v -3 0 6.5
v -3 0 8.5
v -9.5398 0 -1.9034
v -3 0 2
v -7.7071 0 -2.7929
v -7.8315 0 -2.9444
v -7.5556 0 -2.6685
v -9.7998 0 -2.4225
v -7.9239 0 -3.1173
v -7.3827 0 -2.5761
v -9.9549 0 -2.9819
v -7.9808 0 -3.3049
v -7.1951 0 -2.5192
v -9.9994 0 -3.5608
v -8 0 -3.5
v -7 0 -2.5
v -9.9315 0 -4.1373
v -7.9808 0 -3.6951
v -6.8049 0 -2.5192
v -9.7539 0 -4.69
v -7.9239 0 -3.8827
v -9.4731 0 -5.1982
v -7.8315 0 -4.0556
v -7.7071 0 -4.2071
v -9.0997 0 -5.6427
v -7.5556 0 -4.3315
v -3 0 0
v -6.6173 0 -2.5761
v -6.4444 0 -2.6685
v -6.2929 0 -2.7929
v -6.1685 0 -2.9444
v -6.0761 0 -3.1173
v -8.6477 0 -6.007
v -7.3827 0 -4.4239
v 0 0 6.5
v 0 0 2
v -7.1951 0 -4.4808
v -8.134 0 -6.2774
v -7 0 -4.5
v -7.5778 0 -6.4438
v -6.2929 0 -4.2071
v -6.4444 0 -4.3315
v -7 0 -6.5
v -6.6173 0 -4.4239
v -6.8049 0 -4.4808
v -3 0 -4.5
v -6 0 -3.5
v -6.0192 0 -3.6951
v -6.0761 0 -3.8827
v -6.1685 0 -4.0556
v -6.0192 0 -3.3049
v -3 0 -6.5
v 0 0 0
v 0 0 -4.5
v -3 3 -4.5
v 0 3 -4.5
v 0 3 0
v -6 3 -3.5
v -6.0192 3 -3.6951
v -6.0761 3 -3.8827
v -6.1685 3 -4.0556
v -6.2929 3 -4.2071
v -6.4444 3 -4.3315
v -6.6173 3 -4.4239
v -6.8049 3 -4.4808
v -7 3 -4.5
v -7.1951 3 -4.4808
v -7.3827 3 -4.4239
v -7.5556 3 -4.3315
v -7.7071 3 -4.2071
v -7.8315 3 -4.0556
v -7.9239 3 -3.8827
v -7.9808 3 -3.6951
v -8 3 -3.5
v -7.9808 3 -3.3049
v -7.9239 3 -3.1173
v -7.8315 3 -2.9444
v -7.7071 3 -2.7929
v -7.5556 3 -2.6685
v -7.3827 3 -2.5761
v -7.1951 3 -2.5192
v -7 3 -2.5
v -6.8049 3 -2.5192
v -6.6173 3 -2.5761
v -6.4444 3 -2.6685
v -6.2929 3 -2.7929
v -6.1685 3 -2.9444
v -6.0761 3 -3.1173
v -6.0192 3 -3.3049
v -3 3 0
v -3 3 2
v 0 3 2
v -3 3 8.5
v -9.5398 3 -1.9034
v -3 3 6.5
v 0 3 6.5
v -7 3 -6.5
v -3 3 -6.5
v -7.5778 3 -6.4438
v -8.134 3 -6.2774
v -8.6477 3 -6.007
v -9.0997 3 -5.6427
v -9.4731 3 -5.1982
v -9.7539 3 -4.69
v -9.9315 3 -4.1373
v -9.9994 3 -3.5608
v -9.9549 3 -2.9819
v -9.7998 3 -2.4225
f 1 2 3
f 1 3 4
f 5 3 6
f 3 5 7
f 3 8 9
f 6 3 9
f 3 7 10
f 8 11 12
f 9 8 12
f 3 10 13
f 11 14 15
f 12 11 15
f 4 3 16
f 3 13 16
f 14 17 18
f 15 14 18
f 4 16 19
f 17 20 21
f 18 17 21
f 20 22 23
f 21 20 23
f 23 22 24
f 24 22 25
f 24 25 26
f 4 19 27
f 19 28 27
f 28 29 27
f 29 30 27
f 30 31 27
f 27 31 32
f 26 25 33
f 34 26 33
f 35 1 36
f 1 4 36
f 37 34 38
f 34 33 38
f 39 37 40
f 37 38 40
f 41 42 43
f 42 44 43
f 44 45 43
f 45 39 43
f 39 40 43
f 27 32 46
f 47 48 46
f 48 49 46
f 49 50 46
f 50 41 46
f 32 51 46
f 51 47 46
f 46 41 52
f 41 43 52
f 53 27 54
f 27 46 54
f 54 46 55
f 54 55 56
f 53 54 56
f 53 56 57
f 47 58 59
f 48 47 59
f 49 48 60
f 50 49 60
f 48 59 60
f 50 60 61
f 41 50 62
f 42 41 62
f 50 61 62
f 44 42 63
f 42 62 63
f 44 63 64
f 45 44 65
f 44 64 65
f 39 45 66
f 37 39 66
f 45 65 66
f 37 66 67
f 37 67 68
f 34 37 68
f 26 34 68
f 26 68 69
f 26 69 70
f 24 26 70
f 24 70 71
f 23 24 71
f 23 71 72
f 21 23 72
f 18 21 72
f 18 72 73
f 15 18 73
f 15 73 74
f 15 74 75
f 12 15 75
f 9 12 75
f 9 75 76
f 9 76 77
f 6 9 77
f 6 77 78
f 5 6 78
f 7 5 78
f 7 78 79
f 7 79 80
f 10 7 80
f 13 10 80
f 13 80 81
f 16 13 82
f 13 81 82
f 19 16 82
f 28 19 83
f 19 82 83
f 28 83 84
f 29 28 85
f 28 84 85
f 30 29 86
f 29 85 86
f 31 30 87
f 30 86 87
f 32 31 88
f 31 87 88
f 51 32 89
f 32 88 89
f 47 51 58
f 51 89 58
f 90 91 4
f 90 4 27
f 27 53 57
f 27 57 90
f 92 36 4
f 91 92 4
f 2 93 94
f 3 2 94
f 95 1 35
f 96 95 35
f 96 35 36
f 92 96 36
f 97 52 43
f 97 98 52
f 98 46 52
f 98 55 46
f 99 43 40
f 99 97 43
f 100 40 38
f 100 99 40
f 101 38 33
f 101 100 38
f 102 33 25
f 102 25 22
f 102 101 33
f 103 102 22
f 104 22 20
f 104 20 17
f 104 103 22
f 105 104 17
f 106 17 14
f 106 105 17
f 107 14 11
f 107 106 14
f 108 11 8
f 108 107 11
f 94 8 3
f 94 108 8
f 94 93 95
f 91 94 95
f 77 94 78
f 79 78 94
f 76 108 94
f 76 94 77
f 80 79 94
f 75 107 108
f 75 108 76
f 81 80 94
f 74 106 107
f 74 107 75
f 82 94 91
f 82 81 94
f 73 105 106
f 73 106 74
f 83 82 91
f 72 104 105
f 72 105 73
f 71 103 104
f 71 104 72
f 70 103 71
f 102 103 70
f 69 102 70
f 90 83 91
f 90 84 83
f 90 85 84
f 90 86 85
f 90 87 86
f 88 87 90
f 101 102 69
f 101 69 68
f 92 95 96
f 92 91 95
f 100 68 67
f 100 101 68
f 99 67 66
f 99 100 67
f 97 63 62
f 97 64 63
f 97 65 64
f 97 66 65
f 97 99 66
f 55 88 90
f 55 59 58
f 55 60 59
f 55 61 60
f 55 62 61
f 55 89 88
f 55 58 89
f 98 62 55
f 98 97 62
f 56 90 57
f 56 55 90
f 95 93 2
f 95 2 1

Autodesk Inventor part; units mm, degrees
ref_plane "YZ Plane" through (0, 0, 0) normal (1, 0, 0) x (0, 1, 0)
ref_plane "XZ Plane" through (0, 0, 0) normal (0, 1, 0) x (-1, 0, 0)
ref_plane "XY Plane" through (0, 0, 0) normal (0, 0, 1) x (1, 0, 0)
sketch "Sketch1" plane through (0, 0, 0) normal (0, 1, 0) x (-1, 0, 0)
  line L0 (0, 0) -> (3, 0)
  line L1 (3, 0) -> (3, -4.5)
  line L2 (3, -4.5) -> (0, -4.5)
  line L3 (0, -4.5) -> (0, 0)
  line L4 (0, 1) -> (4.5153, 1) construction
  line L5 (0, 2) -> (3, 2)
  line L6 (3, 2) -> (3, 6.5)
  line L7 (3, 6.5) -> (0, 6.5)
  line L8 (0, 6.5) -> (0, 2)
  dimension "d0" = 4.5
  dimension "d1" = 3
  dimension "d2" = 1
extrude "Extrusion1" add sketch "Sketch1" along normal blind 3
sketch "Sketch2" plane through (0, 3, 0) normal (0, 1, 0) x (1, 0, 0)
  line L0 (-3, -8.5) -> (-3, 6.5)
  line L1 (-3, 6.5) -> (-7, 6.5)
  line L2 (-3, -8.5) -> (-9.5398, 1.9034)
  arc A0 (-7, 6.5) -> (-9.5398, 1.9034) centre (-7, 3.5) ccw
  point P0 (0, 0)
  point P1 (-3, -6.5)
  dimension "d5" = 2
  dimension "d6" = 15
  dimension "d10" = 3
  dimension "d11" = 4
extrude "Extrusion2" add sketch "Sketch2" against normal blind 3
sketch "Sketch3" plane through (0, 3, 0) normal (0, 1, 0) x (1, 0, 0)
  circle A0 centre (-7, 3.5) radius 1
  point P0 (0, 0)
  dimension "d14" = 2
extrude "Extrusion3" cut sketch "Sketch3" against normal blind 3
properties part number "Hinge"
